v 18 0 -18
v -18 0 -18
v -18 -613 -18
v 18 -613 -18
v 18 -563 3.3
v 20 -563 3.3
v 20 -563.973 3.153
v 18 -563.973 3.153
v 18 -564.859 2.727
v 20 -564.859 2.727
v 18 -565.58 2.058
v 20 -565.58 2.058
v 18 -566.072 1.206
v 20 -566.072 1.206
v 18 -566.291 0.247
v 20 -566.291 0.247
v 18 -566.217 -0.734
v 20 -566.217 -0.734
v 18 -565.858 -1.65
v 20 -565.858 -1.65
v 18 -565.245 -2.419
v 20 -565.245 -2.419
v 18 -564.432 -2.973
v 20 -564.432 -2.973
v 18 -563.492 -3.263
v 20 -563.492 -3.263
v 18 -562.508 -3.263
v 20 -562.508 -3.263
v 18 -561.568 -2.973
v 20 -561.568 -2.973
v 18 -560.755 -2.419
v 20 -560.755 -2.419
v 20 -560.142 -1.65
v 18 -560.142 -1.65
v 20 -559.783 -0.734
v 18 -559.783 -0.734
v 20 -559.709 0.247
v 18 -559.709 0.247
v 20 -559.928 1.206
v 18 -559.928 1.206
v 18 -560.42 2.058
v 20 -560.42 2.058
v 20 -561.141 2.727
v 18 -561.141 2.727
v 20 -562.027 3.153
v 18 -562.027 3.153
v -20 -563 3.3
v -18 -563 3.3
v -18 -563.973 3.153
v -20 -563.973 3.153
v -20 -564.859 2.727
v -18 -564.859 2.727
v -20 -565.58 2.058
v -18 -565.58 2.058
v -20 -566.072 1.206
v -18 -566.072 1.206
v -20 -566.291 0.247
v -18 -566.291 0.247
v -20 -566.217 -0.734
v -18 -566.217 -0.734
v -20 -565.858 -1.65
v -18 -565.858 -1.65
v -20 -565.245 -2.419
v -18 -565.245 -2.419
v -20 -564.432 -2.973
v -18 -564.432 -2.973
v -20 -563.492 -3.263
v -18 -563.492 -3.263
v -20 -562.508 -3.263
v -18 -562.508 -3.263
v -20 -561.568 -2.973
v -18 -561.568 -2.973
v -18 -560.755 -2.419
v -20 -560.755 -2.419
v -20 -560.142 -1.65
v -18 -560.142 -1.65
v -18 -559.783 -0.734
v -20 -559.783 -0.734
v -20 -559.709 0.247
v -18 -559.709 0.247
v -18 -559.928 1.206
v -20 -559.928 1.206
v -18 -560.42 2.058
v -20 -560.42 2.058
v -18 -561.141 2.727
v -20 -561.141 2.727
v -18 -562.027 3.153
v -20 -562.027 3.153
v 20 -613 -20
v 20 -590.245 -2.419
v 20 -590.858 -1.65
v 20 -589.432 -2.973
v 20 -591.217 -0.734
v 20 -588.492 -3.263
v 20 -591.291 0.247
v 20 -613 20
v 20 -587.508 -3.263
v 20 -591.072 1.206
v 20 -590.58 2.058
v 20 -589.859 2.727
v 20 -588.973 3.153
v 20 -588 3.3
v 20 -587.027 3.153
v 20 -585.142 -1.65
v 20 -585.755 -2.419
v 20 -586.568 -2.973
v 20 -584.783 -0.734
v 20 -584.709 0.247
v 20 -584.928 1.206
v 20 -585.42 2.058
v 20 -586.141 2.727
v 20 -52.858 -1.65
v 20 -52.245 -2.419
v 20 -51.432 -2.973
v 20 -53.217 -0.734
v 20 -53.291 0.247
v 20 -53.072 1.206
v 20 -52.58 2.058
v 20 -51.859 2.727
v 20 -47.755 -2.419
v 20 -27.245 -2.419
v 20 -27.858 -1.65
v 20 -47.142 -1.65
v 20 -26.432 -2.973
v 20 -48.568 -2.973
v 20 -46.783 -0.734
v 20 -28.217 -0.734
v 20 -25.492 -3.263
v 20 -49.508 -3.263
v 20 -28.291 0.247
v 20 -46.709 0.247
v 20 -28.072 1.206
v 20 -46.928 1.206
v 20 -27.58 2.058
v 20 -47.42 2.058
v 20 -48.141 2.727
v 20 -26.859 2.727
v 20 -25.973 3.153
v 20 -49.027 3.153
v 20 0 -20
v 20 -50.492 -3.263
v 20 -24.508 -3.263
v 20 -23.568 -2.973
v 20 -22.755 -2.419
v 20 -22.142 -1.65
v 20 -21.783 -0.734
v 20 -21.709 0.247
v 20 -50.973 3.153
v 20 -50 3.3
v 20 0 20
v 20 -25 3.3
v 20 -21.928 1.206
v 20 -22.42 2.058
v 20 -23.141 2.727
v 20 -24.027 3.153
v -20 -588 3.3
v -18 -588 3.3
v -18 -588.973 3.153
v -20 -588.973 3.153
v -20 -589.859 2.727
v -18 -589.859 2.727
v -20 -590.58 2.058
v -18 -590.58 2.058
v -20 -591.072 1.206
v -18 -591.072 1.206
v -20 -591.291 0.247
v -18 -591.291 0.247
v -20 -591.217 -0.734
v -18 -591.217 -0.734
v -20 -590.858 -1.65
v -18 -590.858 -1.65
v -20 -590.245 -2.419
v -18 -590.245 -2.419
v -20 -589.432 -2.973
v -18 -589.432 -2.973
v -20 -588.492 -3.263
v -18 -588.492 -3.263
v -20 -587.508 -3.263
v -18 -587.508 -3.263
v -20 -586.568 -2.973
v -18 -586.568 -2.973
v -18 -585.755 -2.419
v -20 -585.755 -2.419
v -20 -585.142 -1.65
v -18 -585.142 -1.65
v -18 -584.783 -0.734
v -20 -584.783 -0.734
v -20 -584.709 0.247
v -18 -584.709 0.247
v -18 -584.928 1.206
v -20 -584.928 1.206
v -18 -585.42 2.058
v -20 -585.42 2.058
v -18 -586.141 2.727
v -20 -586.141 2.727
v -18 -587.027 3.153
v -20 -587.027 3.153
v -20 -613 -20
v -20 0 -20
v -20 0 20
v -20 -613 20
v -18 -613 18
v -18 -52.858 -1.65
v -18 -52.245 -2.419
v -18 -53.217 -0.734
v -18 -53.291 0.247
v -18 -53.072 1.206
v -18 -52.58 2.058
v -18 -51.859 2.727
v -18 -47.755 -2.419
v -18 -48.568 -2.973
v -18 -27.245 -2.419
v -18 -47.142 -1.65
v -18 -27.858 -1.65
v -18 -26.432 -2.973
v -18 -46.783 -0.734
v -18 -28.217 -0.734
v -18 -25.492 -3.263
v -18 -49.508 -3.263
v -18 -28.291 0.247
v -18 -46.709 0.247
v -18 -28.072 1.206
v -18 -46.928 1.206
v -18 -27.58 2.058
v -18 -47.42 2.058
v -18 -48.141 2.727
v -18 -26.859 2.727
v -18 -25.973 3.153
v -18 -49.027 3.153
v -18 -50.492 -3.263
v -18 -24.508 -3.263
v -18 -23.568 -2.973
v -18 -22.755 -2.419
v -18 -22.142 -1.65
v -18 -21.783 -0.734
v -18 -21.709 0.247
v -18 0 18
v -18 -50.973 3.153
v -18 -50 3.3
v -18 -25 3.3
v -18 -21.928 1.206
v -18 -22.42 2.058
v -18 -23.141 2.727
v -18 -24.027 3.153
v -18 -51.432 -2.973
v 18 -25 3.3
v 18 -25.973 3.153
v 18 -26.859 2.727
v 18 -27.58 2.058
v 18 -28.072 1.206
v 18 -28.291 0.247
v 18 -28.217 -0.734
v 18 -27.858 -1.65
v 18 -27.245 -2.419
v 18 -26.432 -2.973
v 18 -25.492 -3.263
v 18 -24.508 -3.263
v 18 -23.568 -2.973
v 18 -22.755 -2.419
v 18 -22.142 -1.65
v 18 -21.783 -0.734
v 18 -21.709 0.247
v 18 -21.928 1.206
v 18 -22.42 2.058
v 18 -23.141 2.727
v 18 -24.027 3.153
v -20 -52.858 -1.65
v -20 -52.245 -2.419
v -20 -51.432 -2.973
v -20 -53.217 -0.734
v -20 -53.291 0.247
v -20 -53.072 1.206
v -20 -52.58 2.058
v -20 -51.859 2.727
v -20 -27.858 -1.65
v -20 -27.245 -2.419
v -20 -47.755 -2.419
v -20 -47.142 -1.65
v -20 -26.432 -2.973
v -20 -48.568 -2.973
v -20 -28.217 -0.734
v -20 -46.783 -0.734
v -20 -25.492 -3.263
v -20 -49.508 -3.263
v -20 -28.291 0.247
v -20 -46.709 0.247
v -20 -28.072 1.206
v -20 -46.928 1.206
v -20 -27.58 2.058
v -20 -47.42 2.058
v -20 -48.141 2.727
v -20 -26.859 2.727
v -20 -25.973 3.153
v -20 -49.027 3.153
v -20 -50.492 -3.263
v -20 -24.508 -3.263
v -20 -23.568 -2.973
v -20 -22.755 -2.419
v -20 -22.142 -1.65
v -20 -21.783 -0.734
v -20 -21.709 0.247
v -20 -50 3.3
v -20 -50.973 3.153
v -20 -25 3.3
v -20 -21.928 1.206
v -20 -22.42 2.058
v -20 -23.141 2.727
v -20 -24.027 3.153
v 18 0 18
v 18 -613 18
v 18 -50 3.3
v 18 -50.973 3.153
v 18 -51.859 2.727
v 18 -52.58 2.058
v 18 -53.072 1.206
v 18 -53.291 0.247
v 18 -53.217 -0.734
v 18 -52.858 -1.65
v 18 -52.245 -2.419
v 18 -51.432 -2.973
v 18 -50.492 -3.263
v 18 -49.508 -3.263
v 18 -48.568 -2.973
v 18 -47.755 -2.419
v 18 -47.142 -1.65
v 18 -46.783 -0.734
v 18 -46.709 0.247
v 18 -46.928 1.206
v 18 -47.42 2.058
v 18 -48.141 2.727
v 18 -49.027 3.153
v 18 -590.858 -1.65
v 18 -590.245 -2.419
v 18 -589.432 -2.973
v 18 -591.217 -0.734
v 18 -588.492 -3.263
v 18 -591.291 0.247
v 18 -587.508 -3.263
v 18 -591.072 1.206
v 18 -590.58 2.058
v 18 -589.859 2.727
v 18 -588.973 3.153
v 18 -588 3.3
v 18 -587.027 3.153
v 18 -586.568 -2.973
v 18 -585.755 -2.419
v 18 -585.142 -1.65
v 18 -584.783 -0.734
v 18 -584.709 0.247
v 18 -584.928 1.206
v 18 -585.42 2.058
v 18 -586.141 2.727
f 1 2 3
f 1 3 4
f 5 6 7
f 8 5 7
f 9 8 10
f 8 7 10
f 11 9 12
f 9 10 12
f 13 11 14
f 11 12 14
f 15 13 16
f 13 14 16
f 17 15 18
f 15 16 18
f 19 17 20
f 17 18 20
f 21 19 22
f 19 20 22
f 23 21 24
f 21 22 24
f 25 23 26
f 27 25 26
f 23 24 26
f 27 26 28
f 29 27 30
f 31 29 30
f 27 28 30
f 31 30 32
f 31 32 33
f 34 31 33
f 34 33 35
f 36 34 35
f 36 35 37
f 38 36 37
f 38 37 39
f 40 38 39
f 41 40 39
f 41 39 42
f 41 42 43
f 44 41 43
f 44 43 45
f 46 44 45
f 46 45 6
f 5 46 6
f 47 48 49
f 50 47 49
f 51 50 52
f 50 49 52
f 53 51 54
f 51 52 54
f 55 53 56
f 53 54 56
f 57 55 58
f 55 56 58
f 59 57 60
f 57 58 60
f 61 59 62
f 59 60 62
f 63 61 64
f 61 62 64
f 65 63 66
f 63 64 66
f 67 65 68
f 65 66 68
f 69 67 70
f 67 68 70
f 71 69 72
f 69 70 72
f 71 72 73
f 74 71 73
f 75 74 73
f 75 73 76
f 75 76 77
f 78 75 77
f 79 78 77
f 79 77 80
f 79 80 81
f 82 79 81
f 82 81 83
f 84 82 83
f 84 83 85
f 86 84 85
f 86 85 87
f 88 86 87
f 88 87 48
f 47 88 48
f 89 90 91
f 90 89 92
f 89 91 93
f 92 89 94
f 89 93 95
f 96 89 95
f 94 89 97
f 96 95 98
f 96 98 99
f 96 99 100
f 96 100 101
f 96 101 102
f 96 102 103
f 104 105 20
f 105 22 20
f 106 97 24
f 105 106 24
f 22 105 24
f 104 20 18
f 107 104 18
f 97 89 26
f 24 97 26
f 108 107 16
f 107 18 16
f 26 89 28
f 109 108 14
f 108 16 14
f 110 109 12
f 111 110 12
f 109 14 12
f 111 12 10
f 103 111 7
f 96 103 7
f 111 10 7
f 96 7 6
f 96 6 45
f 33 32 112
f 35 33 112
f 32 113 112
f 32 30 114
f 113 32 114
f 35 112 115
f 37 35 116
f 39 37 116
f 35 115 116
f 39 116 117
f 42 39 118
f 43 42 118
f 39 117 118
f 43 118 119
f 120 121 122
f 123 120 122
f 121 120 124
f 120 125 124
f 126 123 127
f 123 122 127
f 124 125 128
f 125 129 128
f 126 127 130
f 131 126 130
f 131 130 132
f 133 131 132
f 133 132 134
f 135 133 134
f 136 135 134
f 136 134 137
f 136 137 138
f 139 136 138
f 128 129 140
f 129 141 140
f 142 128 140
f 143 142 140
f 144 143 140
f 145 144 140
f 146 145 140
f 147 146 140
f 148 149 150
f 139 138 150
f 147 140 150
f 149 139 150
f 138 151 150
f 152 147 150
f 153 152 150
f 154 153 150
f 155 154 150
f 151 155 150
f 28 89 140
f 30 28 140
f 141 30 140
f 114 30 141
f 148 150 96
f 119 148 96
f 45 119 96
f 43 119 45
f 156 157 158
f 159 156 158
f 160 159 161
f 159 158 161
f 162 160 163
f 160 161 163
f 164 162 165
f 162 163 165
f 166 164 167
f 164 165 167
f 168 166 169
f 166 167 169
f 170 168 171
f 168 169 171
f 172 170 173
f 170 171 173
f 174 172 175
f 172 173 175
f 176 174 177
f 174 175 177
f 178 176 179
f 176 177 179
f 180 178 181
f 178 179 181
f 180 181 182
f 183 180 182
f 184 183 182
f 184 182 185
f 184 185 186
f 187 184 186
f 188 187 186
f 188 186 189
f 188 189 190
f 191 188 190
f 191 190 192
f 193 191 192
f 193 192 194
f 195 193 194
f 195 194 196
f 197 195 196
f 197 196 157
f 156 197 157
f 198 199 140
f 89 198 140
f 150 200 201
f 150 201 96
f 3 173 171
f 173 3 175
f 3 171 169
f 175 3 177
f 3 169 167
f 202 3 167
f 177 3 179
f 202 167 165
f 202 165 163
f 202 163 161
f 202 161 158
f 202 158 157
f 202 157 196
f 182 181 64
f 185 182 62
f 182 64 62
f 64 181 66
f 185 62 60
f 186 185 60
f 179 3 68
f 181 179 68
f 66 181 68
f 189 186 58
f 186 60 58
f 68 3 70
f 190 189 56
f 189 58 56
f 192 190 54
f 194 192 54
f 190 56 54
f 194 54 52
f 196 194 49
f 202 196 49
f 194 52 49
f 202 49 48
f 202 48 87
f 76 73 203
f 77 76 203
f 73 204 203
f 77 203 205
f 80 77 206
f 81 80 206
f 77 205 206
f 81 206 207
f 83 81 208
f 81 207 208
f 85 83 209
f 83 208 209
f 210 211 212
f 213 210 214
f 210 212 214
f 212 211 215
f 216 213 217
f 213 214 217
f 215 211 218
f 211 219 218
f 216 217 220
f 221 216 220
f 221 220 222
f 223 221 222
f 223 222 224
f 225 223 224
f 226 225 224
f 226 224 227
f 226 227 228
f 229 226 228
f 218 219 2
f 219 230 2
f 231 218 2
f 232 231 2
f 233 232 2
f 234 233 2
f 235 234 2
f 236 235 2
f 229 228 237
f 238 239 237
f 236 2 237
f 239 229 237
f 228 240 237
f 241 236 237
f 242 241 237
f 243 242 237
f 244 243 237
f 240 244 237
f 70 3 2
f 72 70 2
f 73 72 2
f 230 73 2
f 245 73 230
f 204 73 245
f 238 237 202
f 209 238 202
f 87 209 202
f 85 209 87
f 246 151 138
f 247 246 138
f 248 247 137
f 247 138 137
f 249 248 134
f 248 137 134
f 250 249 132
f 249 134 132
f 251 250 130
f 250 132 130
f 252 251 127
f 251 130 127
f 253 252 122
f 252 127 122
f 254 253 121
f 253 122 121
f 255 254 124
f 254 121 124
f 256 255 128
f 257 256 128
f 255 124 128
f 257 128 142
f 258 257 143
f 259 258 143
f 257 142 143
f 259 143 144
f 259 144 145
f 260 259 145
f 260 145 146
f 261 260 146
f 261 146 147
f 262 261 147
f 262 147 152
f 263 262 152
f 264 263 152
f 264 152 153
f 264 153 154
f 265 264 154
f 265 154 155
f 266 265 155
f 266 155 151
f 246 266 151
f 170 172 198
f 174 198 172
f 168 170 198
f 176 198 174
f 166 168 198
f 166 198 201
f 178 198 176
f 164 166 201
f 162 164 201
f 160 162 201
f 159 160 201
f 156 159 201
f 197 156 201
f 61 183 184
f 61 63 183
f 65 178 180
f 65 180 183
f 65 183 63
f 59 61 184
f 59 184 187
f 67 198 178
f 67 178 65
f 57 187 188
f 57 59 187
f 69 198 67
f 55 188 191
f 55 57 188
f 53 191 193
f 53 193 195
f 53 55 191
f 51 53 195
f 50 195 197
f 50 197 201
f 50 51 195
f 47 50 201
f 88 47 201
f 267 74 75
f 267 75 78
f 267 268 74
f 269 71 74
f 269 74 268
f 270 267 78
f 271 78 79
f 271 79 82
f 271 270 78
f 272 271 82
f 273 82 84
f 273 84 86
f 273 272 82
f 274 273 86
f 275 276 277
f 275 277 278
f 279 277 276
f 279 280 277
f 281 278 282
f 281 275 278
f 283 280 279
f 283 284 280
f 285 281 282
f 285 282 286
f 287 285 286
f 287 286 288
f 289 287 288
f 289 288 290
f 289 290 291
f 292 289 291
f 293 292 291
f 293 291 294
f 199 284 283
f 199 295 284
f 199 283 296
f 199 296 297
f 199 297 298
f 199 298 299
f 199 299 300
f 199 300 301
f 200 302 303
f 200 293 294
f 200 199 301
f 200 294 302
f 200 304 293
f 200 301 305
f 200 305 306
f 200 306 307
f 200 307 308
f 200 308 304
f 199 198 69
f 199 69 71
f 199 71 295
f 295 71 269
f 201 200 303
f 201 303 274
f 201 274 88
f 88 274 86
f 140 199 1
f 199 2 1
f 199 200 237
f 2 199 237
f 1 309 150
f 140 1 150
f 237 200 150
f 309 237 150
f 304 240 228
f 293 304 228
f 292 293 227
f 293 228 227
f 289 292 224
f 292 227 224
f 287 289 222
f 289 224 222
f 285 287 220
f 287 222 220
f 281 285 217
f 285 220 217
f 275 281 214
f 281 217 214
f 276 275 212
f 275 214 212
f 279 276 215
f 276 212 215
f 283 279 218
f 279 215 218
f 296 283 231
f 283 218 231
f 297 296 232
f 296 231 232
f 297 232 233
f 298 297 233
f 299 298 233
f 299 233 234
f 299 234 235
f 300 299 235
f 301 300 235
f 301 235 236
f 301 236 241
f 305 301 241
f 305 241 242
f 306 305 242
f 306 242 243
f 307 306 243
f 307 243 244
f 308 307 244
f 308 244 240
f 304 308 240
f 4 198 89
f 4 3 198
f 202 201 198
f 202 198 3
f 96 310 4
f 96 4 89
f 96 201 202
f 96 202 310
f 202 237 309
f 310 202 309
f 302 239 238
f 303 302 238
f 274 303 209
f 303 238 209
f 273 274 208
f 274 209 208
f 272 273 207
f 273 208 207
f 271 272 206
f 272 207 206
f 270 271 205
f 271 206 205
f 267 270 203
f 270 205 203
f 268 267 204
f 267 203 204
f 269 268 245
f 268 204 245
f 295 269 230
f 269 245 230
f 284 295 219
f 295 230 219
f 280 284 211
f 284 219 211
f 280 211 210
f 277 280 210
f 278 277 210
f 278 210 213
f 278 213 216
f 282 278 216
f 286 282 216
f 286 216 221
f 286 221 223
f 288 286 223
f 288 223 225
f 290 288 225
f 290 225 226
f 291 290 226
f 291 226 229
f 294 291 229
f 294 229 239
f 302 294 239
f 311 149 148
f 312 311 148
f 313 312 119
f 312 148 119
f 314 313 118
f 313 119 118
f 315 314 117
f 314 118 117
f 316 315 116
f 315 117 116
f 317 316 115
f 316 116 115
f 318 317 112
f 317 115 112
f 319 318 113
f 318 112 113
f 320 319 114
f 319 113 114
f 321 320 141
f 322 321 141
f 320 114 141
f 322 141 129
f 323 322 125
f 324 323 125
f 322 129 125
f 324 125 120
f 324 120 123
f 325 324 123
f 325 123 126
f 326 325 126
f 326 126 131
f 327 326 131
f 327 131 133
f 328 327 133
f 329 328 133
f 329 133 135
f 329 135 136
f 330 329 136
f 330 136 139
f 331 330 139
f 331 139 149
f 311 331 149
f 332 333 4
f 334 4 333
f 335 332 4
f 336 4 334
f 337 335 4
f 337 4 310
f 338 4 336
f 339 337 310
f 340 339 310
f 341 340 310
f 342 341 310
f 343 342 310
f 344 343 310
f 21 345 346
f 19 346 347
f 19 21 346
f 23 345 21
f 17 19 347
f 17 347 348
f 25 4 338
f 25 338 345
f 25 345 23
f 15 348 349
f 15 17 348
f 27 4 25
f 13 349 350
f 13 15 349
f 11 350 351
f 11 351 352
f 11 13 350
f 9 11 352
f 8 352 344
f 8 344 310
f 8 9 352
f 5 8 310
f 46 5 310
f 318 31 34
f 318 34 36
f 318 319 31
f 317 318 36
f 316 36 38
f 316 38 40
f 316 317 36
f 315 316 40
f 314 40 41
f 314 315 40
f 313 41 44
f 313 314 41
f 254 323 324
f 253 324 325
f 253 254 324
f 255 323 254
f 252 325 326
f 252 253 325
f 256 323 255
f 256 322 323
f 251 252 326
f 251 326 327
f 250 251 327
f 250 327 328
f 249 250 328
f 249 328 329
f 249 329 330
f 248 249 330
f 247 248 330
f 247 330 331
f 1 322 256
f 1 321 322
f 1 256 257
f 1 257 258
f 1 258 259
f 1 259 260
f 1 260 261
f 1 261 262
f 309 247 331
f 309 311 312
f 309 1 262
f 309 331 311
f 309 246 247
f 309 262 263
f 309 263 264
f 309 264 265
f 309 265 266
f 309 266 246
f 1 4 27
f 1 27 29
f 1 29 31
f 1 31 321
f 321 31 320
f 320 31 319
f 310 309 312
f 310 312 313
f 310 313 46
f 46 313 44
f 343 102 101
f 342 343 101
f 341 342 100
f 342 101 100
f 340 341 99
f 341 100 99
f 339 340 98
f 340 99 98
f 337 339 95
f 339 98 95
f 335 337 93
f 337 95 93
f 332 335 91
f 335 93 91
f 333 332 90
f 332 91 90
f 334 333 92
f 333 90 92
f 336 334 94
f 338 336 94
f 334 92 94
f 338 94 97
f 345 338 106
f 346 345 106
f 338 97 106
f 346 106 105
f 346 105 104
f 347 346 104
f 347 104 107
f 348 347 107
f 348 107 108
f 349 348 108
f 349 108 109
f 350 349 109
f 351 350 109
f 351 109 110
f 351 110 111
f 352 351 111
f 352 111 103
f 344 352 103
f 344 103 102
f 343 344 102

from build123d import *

# Parameters (mm, degrees)
SKETCH_W    = 40
SKETCH_H    = 40
SKETCH_W_2  = 36
SKETCH_H_2  = 36
PAD_DEPTH   = 613
SKETCH001_R = 3.3
HOLE_DEPTH  = 40.001


with BuildPart() as part:
    # Sketch → Pad (new body)
    with BuildSketch(Plane.XZ):
        Rectangle(SKETCH_W, SKETCH_H)
        Rectangle(SKETCH_W_2, SKETCH_H_2, mode=Mode.SUBTRACT)
    extrude(amount=PAD_DEPTH)

    # Sketch001 → Hole (cut, through all)
    with BuildSketch(Plane(origin=(20, 0, 0), x_dir=(0, 0, 1), z_dir=(1, 0, 0))):
        with Locations((0, 25)):
            Circle(SKETCH001_R)
        with Locations((0, 50)):
            Circle(SKETCH001_R)
        with Locations((0, 588)):
            Circle(SKETCH001_R)
        with Locations((0, 563)):
            Circle(SKETCH001_R)
    extrude(amount=-HOLE_DEPTH, mode=Mode.SUBTRACT)


solid = part.part
